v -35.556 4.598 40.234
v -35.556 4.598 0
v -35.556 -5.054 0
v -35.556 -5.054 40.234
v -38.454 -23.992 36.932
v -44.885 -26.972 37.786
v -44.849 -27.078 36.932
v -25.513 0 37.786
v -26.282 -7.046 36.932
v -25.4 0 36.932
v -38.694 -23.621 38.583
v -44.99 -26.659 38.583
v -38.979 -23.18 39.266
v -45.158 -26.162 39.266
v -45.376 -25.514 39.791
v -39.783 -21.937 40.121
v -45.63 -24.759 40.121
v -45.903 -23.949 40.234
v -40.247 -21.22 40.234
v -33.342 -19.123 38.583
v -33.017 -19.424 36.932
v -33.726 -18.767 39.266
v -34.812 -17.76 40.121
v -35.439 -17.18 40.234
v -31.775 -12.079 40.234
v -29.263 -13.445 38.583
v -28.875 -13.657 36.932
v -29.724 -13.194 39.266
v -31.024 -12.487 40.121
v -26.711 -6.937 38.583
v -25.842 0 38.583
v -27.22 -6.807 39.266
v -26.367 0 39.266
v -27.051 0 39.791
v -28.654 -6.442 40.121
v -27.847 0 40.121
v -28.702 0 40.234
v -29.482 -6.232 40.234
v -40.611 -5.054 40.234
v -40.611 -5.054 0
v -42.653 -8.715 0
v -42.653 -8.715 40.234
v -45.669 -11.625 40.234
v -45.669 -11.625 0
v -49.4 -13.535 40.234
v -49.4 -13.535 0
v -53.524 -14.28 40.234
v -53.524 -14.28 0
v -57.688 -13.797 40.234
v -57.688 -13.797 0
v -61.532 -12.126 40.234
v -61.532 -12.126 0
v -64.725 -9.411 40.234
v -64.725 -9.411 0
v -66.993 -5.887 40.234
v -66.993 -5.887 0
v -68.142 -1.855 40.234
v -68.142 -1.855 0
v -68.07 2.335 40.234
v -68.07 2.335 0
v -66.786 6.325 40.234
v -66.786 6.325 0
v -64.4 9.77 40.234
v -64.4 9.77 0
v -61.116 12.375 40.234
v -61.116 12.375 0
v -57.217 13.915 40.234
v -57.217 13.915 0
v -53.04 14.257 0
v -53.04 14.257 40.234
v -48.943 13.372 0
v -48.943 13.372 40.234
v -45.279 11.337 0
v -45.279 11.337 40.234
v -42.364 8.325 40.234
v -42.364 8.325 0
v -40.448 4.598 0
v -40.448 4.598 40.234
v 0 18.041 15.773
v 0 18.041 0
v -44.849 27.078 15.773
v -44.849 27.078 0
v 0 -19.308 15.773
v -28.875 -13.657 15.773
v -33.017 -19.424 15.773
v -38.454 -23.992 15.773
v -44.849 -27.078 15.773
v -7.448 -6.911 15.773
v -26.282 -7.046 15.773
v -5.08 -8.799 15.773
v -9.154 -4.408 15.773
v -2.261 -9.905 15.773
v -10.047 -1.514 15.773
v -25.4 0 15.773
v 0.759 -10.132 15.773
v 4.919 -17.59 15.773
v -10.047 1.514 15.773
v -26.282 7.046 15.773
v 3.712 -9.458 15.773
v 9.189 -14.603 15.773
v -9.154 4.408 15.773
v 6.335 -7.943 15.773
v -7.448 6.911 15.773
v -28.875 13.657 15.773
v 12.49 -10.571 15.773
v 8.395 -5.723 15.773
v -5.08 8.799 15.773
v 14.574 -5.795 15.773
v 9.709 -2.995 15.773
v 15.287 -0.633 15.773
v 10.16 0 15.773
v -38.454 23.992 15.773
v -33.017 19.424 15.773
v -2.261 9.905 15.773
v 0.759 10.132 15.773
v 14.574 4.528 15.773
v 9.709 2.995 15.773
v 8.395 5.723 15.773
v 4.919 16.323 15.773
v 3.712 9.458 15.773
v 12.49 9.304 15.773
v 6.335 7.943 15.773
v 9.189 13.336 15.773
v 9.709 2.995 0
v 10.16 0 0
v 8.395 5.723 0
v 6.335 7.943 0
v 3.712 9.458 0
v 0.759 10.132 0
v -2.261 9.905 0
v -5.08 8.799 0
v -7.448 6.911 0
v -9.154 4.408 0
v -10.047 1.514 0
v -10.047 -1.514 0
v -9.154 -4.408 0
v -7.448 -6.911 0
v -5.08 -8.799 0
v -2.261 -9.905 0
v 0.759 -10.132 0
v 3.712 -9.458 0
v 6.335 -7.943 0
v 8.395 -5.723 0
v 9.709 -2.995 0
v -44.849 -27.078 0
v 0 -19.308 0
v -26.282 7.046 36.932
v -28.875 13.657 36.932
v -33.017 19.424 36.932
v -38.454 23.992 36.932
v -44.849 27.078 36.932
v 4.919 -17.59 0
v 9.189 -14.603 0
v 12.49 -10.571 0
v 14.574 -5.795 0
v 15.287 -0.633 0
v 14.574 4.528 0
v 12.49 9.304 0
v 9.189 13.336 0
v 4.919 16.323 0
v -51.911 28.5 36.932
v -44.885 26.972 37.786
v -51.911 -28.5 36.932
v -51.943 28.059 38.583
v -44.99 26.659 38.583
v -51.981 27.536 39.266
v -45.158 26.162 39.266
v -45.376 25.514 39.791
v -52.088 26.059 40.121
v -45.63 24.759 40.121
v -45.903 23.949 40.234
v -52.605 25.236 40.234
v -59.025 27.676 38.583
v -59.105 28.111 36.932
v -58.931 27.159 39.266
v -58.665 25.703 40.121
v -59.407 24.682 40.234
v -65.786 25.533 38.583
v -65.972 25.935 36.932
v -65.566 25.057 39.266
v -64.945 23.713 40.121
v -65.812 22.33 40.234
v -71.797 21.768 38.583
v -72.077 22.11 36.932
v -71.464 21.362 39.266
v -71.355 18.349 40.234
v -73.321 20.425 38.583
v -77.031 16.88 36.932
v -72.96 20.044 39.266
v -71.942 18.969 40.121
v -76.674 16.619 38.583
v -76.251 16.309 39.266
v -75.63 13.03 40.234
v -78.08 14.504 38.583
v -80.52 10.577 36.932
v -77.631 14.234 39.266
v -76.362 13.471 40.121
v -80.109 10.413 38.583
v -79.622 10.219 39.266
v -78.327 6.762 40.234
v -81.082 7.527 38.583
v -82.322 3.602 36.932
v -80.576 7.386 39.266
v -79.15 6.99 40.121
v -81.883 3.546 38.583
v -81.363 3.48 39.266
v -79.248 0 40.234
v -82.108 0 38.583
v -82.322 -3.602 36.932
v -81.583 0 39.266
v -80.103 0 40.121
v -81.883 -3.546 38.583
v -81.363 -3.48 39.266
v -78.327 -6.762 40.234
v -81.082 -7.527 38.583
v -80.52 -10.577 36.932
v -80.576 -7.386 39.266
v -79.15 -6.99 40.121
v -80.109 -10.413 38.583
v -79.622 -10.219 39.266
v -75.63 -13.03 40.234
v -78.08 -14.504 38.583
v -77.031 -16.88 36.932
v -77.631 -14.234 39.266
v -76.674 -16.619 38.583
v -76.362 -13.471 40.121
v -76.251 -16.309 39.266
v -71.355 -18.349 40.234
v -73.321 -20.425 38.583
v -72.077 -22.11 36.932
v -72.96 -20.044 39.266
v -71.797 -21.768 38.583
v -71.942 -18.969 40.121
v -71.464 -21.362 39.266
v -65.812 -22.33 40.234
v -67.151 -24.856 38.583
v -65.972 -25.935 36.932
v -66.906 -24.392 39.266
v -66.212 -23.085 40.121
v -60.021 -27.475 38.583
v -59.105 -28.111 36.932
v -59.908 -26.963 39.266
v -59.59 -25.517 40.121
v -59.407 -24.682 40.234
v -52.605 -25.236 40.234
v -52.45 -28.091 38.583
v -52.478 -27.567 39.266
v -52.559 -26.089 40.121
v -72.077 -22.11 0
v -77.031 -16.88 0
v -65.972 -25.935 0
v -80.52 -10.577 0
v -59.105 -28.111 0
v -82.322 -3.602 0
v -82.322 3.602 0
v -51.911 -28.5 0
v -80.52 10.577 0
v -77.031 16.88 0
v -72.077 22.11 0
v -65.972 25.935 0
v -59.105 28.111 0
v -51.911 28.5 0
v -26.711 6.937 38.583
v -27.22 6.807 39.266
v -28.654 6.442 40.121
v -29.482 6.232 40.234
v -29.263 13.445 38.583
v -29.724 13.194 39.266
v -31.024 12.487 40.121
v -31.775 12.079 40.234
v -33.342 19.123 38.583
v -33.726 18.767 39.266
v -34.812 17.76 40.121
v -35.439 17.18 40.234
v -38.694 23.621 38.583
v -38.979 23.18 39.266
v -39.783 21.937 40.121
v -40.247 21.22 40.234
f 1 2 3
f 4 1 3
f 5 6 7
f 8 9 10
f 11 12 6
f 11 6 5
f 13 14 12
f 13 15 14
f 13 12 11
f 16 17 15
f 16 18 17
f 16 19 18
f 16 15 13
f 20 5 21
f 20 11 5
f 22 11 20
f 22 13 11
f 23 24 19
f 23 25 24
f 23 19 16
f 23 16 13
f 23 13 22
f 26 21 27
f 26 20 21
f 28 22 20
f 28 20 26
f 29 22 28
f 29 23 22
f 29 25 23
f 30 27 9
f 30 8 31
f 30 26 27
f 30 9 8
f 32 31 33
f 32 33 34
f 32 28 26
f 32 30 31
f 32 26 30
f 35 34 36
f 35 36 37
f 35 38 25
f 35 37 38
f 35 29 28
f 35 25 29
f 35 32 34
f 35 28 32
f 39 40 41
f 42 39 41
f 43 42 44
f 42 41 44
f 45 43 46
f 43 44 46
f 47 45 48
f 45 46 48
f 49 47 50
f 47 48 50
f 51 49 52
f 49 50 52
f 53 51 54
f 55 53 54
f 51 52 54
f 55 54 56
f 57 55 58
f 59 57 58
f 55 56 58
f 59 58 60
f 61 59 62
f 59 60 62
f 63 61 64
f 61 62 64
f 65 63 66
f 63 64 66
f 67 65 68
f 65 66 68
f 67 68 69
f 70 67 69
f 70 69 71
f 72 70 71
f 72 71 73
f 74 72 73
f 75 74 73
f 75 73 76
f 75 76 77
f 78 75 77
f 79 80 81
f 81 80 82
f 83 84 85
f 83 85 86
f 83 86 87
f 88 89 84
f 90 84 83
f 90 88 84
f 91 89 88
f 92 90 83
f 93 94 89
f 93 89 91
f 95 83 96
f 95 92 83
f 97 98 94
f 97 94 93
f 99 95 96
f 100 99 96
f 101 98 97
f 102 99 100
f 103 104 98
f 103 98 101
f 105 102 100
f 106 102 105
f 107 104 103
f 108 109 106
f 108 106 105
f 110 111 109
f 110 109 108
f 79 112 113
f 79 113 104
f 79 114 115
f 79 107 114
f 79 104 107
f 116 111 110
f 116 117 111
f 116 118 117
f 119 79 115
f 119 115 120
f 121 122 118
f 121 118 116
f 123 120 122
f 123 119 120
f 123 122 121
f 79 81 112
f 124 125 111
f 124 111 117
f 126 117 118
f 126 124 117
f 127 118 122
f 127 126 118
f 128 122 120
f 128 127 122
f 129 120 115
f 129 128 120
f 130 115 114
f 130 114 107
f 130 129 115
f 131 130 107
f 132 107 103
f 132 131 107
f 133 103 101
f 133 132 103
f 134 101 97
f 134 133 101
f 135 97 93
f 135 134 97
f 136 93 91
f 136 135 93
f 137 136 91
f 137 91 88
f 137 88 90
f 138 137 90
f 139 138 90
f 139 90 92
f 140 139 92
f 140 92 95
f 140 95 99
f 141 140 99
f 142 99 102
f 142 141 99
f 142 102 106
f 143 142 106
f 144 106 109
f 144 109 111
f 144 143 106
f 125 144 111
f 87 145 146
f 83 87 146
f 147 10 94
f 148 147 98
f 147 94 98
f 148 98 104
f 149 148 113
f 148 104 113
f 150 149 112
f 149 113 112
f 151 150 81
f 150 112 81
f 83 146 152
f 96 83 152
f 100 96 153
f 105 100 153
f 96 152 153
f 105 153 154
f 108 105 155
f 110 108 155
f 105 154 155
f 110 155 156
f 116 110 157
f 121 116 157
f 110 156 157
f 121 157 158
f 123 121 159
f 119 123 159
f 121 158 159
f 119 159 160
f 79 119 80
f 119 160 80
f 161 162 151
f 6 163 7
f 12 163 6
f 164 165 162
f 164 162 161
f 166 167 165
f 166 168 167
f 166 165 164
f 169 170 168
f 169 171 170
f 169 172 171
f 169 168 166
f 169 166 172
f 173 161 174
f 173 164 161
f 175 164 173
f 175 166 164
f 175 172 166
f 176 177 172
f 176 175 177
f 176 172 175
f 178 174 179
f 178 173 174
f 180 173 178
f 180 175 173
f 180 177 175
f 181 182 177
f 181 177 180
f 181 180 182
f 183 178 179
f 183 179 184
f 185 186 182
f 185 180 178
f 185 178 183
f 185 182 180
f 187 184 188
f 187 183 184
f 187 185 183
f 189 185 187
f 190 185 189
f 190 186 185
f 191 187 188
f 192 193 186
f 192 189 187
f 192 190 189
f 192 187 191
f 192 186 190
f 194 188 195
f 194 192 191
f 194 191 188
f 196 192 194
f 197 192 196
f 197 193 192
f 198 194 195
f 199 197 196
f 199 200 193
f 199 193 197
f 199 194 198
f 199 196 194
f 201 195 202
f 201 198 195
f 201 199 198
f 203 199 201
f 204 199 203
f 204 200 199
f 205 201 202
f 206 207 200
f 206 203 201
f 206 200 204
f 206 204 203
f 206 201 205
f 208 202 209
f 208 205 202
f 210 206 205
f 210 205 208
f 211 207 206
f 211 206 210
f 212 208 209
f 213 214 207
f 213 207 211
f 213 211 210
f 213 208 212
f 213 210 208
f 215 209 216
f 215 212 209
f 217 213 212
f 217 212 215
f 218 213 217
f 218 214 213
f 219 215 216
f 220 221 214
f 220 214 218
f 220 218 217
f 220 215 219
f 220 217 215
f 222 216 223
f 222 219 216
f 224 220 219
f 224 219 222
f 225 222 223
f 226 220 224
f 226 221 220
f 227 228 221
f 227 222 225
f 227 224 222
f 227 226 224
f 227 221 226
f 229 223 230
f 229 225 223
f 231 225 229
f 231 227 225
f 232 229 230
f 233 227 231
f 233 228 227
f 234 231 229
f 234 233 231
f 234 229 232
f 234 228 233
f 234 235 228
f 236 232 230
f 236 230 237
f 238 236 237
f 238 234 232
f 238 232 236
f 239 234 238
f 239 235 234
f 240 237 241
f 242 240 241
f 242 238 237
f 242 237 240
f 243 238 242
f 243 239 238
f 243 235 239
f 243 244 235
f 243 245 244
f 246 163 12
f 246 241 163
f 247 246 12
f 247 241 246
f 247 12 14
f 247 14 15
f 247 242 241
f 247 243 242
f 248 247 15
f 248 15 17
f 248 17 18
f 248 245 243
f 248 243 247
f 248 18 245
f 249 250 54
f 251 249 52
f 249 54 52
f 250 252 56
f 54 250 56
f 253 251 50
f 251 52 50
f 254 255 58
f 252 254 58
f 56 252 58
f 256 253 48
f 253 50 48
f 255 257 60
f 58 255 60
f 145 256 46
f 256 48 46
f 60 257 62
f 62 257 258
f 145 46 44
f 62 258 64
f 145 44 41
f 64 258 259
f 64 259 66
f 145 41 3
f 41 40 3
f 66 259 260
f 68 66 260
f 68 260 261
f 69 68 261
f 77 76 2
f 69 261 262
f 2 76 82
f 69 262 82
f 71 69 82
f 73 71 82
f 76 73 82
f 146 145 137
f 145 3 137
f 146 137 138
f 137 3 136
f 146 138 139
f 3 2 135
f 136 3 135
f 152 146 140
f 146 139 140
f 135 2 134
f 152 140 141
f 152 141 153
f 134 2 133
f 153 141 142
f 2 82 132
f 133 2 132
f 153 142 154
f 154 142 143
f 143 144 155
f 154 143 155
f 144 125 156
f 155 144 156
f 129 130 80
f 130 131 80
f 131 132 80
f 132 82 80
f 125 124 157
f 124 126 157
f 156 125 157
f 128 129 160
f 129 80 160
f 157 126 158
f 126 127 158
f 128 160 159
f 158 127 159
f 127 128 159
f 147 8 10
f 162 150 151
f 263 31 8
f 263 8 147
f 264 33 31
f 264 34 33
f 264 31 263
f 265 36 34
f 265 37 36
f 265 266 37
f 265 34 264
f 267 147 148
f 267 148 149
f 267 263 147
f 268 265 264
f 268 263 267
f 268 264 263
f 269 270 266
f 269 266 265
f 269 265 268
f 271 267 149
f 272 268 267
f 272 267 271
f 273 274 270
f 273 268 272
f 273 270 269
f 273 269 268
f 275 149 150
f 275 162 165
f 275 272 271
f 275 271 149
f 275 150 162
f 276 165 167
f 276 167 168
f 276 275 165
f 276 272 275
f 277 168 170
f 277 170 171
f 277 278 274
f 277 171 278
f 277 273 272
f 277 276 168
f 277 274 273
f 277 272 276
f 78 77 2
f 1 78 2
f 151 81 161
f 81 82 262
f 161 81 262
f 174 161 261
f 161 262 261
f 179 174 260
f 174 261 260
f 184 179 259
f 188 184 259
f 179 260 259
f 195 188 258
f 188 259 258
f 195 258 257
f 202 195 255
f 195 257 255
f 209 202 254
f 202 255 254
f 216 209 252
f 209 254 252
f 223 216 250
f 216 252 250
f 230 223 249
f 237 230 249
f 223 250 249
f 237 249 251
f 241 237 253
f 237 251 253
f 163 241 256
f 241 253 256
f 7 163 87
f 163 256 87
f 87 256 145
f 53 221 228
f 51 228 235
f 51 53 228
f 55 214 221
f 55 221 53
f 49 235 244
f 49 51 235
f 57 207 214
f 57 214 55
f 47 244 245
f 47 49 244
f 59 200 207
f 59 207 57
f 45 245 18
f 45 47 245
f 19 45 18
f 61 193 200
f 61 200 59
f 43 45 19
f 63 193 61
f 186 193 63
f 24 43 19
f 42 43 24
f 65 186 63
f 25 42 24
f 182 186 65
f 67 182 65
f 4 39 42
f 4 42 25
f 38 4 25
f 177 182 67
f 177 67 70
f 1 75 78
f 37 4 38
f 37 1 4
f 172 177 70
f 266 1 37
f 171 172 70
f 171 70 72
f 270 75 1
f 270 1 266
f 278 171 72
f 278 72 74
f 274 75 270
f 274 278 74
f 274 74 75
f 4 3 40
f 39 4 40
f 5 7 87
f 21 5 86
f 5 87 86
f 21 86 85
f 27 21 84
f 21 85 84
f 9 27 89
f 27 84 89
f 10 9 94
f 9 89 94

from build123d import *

# Parameters (mm, degrees)
F1_DEPTH = 40.2336
F0_R     = 10.16
F2_DEPTH = 15.7734
F3_R     = 3.302


with BuildPart() as f1:
    # F0 (on Top) → F1 (new body)
    with BuildSketch(Plane.XY):
        with BuildLine():
            ThreePointArc((-44.848745, -27.078443), (-30.766022, -16.669551), (-25.4, 0))
            ThreePointArc((-25.4, 0), (-30.766022, 16.669551), (-44.848745, 27.078443))
            ThreePointArc((-44.848745, 27.078443), (-82.55, 0), (-44.848745, -27.078443))
        make_face()
        with BuildLine():
            ThreePointArc((-40.611343, -5.054238), (-68.260442, 0.242495), (-40.4475, 4.597762))
            Line((-40.4475, 4.597762), (-35.555926, 4.597762))
            Line((-35.555926, 4.597762), (-35.555926, -5.054238))
            Line((-35.555926, -5.054238), (-40.611343, -5.054238))
        make_face(mode=Mode.SUBTRACT)
    extrude(amount=F1_DEPTH)

    # F0 (on Top) → F2 (join)
    with BuildSketch(Plane.XY):
        with BuildLine():
            ThreePointArc((-44.848745, 27.078443), (-30.766022, 16.669551), (-25.4, 0))
            ThreePointArc((-25.4, 0), (-30.766022, -16.669551), (-44.848745, -27.078443))
            Line((-44.848745, -27.078443), (0, -19.308112))
            ThreePointArc((0, -19.308112), (15.286951, -0.633478), (0, 18.041156))
            Line((0, 18.041156), (-44.848745, 27.078443))
        make_face()
        Circle(F0_R, mode=Mode.SUBTRACT)
    extrude(amount=F2_DEPTH)

    # F3
    f3_edges = [f1.edges().sort_by_distance(p)[0] for p in [
        (-63.101255, 27.078443, 40.2336),
    ]]
    fillet(f3_edges, radius=F3_R)


solid = f1.part
